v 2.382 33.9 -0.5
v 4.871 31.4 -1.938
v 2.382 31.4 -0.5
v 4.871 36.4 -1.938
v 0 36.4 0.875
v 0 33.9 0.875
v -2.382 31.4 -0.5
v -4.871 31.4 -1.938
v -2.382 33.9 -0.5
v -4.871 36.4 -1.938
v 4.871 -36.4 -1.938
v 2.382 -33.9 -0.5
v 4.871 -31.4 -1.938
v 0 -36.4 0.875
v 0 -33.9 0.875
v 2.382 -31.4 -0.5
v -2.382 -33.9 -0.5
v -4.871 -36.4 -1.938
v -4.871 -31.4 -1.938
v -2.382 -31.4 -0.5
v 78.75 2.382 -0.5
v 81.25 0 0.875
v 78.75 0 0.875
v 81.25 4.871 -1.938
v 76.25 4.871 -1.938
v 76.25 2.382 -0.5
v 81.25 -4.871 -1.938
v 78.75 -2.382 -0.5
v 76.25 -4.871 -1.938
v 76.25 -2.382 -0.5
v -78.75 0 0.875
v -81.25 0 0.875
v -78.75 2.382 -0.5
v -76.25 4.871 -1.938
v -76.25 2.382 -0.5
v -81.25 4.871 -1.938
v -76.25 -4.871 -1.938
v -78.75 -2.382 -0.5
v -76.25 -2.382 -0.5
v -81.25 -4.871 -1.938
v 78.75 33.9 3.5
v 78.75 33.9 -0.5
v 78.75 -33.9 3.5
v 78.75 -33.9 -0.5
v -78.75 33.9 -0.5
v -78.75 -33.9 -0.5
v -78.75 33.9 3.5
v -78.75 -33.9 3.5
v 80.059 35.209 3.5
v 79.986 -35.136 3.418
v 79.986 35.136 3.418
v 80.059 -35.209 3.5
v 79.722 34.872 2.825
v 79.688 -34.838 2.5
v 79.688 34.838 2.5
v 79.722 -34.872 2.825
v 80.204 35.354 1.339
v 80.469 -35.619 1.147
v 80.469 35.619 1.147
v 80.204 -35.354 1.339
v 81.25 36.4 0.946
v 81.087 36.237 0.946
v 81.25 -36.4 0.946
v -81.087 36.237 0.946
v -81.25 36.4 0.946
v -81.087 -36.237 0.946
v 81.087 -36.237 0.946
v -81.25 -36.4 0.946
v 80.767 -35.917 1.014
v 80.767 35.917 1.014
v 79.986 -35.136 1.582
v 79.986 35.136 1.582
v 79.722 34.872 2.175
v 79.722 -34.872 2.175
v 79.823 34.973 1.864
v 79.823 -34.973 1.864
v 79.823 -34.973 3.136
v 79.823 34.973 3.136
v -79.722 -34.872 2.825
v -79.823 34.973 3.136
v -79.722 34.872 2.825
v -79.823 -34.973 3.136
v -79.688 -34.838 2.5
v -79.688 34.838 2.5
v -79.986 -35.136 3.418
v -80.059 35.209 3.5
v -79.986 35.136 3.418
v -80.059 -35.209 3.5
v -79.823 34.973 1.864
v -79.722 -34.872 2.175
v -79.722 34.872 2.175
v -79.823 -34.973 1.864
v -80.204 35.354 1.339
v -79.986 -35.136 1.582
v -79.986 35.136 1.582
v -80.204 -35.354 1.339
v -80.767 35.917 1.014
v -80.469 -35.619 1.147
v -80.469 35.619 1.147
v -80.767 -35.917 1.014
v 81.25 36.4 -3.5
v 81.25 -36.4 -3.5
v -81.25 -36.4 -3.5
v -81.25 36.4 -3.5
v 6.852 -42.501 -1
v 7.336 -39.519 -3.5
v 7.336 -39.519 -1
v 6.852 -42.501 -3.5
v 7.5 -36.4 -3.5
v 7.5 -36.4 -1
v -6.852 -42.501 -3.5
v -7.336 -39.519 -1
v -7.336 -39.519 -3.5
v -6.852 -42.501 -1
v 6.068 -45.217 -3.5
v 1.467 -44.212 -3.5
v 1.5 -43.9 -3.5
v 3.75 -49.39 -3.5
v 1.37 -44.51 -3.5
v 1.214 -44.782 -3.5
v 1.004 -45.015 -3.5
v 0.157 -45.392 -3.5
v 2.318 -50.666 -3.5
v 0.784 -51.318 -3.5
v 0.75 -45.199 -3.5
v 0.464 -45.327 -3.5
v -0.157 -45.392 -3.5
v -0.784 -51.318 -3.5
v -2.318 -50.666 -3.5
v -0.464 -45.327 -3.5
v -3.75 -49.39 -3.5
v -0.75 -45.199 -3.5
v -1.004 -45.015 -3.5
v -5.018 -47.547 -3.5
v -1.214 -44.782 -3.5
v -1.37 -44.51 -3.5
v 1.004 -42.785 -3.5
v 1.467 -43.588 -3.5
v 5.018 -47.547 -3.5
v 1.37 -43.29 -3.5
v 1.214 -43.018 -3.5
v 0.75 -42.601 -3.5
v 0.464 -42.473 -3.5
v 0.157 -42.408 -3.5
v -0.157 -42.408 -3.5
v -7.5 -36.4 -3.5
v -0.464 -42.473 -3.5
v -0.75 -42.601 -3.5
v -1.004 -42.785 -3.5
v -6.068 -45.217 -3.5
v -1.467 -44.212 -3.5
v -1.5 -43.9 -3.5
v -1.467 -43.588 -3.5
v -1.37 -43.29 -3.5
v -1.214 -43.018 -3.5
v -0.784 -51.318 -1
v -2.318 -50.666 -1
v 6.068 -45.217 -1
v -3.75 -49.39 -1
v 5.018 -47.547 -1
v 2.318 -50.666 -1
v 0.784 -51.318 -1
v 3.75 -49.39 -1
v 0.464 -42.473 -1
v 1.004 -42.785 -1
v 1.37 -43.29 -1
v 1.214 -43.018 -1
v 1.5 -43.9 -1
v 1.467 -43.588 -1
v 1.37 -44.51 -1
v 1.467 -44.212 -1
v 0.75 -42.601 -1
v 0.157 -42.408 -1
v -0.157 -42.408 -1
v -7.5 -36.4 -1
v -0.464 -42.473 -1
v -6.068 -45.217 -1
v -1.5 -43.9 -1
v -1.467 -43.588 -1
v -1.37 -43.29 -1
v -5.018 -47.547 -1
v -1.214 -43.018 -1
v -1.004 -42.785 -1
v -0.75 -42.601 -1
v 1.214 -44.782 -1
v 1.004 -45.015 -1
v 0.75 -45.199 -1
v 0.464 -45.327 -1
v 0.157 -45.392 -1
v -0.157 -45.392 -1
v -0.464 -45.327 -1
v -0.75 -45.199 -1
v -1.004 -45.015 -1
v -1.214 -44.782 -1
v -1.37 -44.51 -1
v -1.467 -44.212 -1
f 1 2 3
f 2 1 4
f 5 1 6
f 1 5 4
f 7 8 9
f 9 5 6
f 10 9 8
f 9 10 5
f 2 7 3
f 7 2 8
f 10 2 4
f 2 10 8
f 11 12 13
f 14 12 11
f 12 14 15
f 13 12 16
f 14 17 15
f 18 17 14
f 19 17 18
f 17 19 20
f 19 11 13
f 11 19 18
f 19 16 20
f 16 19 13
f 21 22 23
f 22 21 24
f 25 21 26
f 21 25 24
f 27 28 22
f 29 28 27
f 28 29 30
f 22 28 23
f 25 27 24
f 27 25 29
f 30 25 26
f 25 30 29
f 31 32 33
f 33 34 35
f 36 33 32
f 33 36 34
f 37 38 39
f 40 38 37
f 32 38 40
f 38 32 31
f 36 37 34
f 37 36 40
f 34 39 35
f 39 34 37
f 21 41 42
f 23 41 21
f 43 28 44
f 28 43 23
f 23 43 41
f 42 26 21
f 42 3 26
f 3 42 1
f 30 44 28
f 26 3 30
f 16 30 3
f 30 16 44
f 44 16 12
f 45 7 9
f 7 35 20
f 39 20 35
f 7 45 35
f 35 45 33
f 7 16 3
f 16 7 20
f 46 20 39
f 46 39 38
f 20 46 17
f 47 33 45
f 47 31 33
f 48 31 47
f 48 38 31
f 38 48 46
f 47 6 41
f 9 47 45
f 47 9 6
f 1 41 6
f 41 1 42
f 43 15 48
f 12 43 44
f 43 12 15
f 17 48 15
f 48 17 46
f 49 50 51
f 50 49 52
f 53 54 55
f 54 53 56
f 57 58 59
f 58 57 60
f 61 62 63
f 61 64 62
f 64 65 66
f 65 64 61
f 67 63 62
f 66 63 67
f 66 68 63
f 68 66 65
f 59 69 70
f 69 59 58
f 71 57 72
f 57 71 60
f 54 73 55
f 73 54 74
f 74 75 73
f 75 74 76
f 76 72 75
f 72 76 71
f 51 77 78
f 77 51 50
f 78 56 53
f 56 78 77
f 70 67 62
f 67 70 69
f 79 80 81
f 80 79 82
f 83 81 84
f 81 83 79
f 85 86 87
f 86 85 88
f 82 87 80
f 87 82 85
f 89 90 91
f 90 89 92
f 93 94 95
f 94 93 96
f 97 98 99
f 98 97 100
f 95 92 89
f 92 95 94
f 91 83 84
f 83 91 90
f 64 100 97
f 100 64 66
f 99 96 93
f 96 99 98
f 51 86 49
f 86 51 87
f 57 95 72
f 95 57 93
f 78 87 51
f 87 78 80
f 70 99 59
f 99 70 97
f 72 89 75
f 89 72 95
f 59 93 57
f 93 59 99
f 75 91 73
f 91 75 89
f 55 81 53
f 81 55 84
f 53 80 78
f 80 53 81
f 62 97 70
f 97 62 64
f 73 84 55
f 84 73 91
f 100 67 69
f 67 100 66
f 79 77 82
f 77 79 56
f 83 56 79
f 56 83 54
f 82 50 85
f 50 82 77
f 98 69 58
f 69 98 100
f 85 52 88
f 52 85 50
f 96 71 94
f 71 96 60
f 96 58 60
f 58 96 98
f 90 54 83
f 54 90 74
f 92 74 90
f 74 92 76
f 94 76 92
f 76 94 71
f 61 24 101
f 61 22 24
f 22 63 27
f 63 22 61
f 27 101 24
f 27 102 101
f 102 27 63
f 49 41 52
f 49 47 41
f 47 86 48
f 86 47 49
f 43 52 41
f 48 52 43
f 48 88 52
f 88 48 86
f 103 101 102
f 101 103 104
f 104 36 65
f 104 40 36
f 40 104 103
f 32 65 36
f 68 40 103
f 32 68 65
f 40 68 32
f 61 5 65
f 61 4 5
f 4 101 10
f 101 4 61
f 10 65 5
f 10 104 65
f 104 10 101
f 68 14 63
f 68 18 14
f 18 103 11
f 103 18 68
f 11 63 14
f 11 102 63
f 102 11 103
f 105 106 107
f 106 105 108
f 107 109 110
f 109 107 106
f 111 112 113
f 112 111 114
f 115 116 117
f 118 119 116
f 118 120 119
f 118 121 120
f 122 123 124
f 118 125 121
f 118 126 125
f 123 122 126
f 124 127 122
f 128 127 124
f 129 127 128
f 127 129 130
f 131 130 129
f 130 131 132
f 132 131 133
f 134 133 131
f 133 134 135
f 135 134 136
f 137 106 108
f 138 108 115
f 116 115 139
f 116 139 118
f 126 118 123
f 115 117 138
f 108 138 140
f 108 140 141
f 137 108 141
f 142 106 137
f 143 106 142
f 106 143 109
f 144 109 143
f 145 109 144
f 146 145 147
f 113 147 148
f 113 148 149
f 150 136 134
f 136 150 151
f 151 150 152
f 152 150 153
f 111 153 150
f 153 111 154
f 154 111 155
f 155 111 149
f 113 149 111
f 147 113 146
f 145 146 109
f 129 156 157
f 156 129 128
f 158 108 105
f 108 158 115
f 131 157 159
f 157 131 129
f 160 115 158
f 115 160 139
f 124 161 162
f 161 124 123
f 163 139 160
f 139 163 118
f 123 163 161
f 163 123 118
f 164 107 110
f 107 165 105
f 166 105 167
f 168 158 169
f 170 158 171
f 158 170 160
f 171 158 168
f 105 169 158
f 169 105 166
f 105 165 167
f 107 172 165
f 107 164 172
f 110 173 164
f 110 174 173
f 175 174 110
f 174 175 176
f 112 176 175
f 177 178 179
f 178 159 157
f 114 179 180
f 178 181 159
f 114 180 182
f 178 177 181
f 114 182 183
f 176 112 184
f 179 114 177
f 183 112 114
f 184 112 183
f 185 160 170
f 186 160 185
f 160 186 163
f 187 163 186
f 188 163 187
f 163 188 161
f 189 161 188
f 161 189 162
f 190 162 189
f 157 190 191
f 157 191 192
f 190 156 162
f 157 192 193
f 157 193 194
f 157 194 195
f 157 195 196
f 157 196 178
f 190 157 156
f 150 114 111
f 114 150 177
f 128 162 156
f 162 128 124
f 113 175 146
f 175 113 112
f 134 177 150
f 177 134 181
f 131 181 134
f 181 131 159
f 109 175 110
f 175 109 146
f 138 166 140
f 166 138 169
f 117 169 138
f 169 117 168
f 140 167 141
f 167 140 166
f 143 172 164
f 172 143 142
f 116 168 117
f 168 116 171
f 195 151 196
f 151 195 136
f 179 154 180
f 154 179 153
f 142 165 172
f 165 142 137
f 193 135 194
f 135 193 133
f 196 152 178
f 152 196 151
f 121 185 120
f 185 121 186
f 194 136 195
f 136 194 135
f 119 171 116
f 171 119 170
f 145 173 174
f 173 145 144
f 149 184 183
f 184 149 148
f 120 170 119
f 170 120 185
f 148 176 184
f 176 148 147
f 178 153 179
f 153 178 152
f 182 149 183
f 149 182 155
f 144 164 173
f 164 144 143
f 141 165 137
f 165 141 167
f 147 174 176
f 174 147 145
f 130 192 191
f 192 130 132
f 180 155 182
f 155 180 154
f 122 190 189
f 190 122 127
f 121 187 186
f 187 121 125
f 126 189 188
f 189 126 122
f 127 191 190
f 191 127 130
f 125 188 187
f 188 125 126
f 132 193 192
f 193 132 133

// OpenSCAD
//------------------Variables------------------\\ 

		//----Global Values----\\
			//The default unit in OpenSCAD is mm and this unit variable allows one to change the variables in the code with units other than mm. Default is 1, for mm, but cm is 10 and inches is 25.4. Note that this entails that you change EVERY variable (except maybe sfn)  so that one piece of the model is not ridiculously bigger/smaller than the other parts. 
				unit=1;

			//The detail in the cylinders/spheres of the shape.
				sfn=30;

		//----Bill Specifics----\\

			//The length of the bill.
				billength= 157.5;

			//The width of the bill. 
				billwidth = 67.8;

			//The thickness of the frame. 
				framethick = 5;
			
			//Bottom Thickness
				botthick = 2 ;

		//----Frame Specifics----\\

			//The border of the frame length-wise. This is the measurement from the inside of the frame to the outisde on the length (x) axis. The cylinders that shape the frame use this measurement.
				xframe = 5;

			//The border of the frame width-wise. This is the measurement from the inside of the frame to the outisde on the width (y) axis.
				yframe = 5;
		
			//How prominent the frame shaping is. Play with this value. Default is 2.
				frameshapethick = 1.6;

			//How raised the frame shaping is. Play with this value as well. 
				frameshaperaise = 0;
		
	//----Paper clip slit size----\\\
		//Width of the paperclip slit. Adjust this value if as you want. 
		slitwidth = 10;
		
		//Height of the slit. This is actually a size control but it mainly changes the size.
		slitheight = 7.5;

		//Where the slit is. Slit is in the middle by default but depending on size you may have to raise or lower this value.
		slitlift =-3;

		//Shape of slit in sides. Default is 3 (triangle) as its overhangs are not unbearable.
		slitshape=3;

		//Slit scale (x,y,z)
		slitscalex= 0.5;
		slitscaley= 1.5;
		slitscalez= 1;
	
	//----Hook sizing----\\
		//Hook size
		hooksize=15;

		//Hook hole size
		hookhole=3;

		//Hook thickness
		hookthick=2.5;

//-------------------Modules-------------------\\ 

	//----Basic Frame Shapes----\\
		module bill() {
			cube([billength*unit, billwidth*unit,framethick*unit], center=true);
		}

		module outsideframe() { 
			cube([(billength+xframe)*unit, (billwidth+yframe)*unit, (framethick+botthick)*unit], center=true);
		}

	//----Frame shaping.----\\
		//Frame shaping cylinder on the X Axis.
			module xfsc() {
				cylinder(r=(framethick*unit)/(frameshapethick*2), h=(billwidth+yframe)*unit+xframe, center=true, $fn=sfn);
			}

		//Frame shaping cylinder on the Y Axis.
			module yfsc() {
				cylinder(r=(framethick*unit)/(frameshapethick*2), h=(billength+xframe)*unit+yframe, center=true, $fn=sfn);
			}

		//Frameshaping general module
			module frameshaping() {
				translate([(billength/2)*unit+xframe/2, 0, (framethick/2)*unit]) {
					rotate([90,0,0]) {
						xfsc();
					}
				}
				translate([(-billength/2)*unit-xframe/2, 0, (framethick/2)*unit]) {
					rotate([90,0,0]) {
						xfsc();
					}
				}

				translate([0, (billwidth/2)*unit+yframe/2, (framethick/2)*unit]) {
					rotate([90,0,90]) {
						yfsc();
					}
				}
				translate([0, (-billwidth/2)*unit-yframe/2, (framethick/2)*unit]) {
					rotate([90,0,90]) {
						yfsc();
					}
				}
			}

	



	//A slit on every side for a paper clip to hold it down
	module clipslit() {
		translate([0, ((billwidth+yframe)/2)*unit, slitlift*unit]) {
			rotate([0,270,90]) {
				scale([slitscalex,slitscaley,slitscalez]) {
					cylinder(r=(slitheight/2)*unit, h=slitwidth*unit, $fn=slitshape, center=true);
				}
			}
		}
		translate([0, ((billwidth+yframe)/2)*-unit, slitlift*unit]) {
			rotate([0,270,90]) {
				scale([slitscalex,slitscaley,slitscalez]) {
					cylinder(r=(slitheight/2)*unit, h=slitwidth*unit, $fn=slitshape, center=true);
				}
			}
		}
		translate([((billength+xframe)/2)*unit, 0, slitlift*unit]) {
			rotate([0,270,0]) {
				scale([slitscalex,slitscaley,slitscalez]) {
					cylinder(r=(slitheight/2)*unit, h=slitwidth*unit, $fn=slitshape, center=true);
				}
			}
		}
		translate([-unit*((billength+xframe)/2), 0, slitlift*unit]) {
			rotate([0,270,0]) {
				scale([slitscalex,slitscaley,slitscalez]) {
					cylinder(r=(slitheight/2)*unit, h=slitwidth*unit, $fn=slitshape, center=true);
				}
			}
		}				
	}

		
	module hook() {
		translate([0,-((billwidth+xframe)/2)*unit, (-(framethick+botthick)/2)*unit ]) {
			difference() {
				scale([1,2,1]) {
					cylinder(r=(hooksize/2)*unit, h=hookthick*unit, $fn=sfn);
				}
				translate([(-hooksize/2)*unit, 0]) {
					cube([hooksize*unit, hooksize*unit, hookthick*unit]);
				}
				translate([0, (-hooksize/2)*unit, 0]) {
					cylinder(r=(hookhole/2)*unit, h=hookthick*unit, $fn=sfn);
				}
			}
		}
	}


	//Plating module
	module frame() {
		difference() {
			outsideframe();
			translate([0,0, botthick]) {
				bill();
				clipslit();
			}
			translate([0,0, frameshaperaise]) {
				frameshaping();
			}
		}
	}

frame();
hook();
